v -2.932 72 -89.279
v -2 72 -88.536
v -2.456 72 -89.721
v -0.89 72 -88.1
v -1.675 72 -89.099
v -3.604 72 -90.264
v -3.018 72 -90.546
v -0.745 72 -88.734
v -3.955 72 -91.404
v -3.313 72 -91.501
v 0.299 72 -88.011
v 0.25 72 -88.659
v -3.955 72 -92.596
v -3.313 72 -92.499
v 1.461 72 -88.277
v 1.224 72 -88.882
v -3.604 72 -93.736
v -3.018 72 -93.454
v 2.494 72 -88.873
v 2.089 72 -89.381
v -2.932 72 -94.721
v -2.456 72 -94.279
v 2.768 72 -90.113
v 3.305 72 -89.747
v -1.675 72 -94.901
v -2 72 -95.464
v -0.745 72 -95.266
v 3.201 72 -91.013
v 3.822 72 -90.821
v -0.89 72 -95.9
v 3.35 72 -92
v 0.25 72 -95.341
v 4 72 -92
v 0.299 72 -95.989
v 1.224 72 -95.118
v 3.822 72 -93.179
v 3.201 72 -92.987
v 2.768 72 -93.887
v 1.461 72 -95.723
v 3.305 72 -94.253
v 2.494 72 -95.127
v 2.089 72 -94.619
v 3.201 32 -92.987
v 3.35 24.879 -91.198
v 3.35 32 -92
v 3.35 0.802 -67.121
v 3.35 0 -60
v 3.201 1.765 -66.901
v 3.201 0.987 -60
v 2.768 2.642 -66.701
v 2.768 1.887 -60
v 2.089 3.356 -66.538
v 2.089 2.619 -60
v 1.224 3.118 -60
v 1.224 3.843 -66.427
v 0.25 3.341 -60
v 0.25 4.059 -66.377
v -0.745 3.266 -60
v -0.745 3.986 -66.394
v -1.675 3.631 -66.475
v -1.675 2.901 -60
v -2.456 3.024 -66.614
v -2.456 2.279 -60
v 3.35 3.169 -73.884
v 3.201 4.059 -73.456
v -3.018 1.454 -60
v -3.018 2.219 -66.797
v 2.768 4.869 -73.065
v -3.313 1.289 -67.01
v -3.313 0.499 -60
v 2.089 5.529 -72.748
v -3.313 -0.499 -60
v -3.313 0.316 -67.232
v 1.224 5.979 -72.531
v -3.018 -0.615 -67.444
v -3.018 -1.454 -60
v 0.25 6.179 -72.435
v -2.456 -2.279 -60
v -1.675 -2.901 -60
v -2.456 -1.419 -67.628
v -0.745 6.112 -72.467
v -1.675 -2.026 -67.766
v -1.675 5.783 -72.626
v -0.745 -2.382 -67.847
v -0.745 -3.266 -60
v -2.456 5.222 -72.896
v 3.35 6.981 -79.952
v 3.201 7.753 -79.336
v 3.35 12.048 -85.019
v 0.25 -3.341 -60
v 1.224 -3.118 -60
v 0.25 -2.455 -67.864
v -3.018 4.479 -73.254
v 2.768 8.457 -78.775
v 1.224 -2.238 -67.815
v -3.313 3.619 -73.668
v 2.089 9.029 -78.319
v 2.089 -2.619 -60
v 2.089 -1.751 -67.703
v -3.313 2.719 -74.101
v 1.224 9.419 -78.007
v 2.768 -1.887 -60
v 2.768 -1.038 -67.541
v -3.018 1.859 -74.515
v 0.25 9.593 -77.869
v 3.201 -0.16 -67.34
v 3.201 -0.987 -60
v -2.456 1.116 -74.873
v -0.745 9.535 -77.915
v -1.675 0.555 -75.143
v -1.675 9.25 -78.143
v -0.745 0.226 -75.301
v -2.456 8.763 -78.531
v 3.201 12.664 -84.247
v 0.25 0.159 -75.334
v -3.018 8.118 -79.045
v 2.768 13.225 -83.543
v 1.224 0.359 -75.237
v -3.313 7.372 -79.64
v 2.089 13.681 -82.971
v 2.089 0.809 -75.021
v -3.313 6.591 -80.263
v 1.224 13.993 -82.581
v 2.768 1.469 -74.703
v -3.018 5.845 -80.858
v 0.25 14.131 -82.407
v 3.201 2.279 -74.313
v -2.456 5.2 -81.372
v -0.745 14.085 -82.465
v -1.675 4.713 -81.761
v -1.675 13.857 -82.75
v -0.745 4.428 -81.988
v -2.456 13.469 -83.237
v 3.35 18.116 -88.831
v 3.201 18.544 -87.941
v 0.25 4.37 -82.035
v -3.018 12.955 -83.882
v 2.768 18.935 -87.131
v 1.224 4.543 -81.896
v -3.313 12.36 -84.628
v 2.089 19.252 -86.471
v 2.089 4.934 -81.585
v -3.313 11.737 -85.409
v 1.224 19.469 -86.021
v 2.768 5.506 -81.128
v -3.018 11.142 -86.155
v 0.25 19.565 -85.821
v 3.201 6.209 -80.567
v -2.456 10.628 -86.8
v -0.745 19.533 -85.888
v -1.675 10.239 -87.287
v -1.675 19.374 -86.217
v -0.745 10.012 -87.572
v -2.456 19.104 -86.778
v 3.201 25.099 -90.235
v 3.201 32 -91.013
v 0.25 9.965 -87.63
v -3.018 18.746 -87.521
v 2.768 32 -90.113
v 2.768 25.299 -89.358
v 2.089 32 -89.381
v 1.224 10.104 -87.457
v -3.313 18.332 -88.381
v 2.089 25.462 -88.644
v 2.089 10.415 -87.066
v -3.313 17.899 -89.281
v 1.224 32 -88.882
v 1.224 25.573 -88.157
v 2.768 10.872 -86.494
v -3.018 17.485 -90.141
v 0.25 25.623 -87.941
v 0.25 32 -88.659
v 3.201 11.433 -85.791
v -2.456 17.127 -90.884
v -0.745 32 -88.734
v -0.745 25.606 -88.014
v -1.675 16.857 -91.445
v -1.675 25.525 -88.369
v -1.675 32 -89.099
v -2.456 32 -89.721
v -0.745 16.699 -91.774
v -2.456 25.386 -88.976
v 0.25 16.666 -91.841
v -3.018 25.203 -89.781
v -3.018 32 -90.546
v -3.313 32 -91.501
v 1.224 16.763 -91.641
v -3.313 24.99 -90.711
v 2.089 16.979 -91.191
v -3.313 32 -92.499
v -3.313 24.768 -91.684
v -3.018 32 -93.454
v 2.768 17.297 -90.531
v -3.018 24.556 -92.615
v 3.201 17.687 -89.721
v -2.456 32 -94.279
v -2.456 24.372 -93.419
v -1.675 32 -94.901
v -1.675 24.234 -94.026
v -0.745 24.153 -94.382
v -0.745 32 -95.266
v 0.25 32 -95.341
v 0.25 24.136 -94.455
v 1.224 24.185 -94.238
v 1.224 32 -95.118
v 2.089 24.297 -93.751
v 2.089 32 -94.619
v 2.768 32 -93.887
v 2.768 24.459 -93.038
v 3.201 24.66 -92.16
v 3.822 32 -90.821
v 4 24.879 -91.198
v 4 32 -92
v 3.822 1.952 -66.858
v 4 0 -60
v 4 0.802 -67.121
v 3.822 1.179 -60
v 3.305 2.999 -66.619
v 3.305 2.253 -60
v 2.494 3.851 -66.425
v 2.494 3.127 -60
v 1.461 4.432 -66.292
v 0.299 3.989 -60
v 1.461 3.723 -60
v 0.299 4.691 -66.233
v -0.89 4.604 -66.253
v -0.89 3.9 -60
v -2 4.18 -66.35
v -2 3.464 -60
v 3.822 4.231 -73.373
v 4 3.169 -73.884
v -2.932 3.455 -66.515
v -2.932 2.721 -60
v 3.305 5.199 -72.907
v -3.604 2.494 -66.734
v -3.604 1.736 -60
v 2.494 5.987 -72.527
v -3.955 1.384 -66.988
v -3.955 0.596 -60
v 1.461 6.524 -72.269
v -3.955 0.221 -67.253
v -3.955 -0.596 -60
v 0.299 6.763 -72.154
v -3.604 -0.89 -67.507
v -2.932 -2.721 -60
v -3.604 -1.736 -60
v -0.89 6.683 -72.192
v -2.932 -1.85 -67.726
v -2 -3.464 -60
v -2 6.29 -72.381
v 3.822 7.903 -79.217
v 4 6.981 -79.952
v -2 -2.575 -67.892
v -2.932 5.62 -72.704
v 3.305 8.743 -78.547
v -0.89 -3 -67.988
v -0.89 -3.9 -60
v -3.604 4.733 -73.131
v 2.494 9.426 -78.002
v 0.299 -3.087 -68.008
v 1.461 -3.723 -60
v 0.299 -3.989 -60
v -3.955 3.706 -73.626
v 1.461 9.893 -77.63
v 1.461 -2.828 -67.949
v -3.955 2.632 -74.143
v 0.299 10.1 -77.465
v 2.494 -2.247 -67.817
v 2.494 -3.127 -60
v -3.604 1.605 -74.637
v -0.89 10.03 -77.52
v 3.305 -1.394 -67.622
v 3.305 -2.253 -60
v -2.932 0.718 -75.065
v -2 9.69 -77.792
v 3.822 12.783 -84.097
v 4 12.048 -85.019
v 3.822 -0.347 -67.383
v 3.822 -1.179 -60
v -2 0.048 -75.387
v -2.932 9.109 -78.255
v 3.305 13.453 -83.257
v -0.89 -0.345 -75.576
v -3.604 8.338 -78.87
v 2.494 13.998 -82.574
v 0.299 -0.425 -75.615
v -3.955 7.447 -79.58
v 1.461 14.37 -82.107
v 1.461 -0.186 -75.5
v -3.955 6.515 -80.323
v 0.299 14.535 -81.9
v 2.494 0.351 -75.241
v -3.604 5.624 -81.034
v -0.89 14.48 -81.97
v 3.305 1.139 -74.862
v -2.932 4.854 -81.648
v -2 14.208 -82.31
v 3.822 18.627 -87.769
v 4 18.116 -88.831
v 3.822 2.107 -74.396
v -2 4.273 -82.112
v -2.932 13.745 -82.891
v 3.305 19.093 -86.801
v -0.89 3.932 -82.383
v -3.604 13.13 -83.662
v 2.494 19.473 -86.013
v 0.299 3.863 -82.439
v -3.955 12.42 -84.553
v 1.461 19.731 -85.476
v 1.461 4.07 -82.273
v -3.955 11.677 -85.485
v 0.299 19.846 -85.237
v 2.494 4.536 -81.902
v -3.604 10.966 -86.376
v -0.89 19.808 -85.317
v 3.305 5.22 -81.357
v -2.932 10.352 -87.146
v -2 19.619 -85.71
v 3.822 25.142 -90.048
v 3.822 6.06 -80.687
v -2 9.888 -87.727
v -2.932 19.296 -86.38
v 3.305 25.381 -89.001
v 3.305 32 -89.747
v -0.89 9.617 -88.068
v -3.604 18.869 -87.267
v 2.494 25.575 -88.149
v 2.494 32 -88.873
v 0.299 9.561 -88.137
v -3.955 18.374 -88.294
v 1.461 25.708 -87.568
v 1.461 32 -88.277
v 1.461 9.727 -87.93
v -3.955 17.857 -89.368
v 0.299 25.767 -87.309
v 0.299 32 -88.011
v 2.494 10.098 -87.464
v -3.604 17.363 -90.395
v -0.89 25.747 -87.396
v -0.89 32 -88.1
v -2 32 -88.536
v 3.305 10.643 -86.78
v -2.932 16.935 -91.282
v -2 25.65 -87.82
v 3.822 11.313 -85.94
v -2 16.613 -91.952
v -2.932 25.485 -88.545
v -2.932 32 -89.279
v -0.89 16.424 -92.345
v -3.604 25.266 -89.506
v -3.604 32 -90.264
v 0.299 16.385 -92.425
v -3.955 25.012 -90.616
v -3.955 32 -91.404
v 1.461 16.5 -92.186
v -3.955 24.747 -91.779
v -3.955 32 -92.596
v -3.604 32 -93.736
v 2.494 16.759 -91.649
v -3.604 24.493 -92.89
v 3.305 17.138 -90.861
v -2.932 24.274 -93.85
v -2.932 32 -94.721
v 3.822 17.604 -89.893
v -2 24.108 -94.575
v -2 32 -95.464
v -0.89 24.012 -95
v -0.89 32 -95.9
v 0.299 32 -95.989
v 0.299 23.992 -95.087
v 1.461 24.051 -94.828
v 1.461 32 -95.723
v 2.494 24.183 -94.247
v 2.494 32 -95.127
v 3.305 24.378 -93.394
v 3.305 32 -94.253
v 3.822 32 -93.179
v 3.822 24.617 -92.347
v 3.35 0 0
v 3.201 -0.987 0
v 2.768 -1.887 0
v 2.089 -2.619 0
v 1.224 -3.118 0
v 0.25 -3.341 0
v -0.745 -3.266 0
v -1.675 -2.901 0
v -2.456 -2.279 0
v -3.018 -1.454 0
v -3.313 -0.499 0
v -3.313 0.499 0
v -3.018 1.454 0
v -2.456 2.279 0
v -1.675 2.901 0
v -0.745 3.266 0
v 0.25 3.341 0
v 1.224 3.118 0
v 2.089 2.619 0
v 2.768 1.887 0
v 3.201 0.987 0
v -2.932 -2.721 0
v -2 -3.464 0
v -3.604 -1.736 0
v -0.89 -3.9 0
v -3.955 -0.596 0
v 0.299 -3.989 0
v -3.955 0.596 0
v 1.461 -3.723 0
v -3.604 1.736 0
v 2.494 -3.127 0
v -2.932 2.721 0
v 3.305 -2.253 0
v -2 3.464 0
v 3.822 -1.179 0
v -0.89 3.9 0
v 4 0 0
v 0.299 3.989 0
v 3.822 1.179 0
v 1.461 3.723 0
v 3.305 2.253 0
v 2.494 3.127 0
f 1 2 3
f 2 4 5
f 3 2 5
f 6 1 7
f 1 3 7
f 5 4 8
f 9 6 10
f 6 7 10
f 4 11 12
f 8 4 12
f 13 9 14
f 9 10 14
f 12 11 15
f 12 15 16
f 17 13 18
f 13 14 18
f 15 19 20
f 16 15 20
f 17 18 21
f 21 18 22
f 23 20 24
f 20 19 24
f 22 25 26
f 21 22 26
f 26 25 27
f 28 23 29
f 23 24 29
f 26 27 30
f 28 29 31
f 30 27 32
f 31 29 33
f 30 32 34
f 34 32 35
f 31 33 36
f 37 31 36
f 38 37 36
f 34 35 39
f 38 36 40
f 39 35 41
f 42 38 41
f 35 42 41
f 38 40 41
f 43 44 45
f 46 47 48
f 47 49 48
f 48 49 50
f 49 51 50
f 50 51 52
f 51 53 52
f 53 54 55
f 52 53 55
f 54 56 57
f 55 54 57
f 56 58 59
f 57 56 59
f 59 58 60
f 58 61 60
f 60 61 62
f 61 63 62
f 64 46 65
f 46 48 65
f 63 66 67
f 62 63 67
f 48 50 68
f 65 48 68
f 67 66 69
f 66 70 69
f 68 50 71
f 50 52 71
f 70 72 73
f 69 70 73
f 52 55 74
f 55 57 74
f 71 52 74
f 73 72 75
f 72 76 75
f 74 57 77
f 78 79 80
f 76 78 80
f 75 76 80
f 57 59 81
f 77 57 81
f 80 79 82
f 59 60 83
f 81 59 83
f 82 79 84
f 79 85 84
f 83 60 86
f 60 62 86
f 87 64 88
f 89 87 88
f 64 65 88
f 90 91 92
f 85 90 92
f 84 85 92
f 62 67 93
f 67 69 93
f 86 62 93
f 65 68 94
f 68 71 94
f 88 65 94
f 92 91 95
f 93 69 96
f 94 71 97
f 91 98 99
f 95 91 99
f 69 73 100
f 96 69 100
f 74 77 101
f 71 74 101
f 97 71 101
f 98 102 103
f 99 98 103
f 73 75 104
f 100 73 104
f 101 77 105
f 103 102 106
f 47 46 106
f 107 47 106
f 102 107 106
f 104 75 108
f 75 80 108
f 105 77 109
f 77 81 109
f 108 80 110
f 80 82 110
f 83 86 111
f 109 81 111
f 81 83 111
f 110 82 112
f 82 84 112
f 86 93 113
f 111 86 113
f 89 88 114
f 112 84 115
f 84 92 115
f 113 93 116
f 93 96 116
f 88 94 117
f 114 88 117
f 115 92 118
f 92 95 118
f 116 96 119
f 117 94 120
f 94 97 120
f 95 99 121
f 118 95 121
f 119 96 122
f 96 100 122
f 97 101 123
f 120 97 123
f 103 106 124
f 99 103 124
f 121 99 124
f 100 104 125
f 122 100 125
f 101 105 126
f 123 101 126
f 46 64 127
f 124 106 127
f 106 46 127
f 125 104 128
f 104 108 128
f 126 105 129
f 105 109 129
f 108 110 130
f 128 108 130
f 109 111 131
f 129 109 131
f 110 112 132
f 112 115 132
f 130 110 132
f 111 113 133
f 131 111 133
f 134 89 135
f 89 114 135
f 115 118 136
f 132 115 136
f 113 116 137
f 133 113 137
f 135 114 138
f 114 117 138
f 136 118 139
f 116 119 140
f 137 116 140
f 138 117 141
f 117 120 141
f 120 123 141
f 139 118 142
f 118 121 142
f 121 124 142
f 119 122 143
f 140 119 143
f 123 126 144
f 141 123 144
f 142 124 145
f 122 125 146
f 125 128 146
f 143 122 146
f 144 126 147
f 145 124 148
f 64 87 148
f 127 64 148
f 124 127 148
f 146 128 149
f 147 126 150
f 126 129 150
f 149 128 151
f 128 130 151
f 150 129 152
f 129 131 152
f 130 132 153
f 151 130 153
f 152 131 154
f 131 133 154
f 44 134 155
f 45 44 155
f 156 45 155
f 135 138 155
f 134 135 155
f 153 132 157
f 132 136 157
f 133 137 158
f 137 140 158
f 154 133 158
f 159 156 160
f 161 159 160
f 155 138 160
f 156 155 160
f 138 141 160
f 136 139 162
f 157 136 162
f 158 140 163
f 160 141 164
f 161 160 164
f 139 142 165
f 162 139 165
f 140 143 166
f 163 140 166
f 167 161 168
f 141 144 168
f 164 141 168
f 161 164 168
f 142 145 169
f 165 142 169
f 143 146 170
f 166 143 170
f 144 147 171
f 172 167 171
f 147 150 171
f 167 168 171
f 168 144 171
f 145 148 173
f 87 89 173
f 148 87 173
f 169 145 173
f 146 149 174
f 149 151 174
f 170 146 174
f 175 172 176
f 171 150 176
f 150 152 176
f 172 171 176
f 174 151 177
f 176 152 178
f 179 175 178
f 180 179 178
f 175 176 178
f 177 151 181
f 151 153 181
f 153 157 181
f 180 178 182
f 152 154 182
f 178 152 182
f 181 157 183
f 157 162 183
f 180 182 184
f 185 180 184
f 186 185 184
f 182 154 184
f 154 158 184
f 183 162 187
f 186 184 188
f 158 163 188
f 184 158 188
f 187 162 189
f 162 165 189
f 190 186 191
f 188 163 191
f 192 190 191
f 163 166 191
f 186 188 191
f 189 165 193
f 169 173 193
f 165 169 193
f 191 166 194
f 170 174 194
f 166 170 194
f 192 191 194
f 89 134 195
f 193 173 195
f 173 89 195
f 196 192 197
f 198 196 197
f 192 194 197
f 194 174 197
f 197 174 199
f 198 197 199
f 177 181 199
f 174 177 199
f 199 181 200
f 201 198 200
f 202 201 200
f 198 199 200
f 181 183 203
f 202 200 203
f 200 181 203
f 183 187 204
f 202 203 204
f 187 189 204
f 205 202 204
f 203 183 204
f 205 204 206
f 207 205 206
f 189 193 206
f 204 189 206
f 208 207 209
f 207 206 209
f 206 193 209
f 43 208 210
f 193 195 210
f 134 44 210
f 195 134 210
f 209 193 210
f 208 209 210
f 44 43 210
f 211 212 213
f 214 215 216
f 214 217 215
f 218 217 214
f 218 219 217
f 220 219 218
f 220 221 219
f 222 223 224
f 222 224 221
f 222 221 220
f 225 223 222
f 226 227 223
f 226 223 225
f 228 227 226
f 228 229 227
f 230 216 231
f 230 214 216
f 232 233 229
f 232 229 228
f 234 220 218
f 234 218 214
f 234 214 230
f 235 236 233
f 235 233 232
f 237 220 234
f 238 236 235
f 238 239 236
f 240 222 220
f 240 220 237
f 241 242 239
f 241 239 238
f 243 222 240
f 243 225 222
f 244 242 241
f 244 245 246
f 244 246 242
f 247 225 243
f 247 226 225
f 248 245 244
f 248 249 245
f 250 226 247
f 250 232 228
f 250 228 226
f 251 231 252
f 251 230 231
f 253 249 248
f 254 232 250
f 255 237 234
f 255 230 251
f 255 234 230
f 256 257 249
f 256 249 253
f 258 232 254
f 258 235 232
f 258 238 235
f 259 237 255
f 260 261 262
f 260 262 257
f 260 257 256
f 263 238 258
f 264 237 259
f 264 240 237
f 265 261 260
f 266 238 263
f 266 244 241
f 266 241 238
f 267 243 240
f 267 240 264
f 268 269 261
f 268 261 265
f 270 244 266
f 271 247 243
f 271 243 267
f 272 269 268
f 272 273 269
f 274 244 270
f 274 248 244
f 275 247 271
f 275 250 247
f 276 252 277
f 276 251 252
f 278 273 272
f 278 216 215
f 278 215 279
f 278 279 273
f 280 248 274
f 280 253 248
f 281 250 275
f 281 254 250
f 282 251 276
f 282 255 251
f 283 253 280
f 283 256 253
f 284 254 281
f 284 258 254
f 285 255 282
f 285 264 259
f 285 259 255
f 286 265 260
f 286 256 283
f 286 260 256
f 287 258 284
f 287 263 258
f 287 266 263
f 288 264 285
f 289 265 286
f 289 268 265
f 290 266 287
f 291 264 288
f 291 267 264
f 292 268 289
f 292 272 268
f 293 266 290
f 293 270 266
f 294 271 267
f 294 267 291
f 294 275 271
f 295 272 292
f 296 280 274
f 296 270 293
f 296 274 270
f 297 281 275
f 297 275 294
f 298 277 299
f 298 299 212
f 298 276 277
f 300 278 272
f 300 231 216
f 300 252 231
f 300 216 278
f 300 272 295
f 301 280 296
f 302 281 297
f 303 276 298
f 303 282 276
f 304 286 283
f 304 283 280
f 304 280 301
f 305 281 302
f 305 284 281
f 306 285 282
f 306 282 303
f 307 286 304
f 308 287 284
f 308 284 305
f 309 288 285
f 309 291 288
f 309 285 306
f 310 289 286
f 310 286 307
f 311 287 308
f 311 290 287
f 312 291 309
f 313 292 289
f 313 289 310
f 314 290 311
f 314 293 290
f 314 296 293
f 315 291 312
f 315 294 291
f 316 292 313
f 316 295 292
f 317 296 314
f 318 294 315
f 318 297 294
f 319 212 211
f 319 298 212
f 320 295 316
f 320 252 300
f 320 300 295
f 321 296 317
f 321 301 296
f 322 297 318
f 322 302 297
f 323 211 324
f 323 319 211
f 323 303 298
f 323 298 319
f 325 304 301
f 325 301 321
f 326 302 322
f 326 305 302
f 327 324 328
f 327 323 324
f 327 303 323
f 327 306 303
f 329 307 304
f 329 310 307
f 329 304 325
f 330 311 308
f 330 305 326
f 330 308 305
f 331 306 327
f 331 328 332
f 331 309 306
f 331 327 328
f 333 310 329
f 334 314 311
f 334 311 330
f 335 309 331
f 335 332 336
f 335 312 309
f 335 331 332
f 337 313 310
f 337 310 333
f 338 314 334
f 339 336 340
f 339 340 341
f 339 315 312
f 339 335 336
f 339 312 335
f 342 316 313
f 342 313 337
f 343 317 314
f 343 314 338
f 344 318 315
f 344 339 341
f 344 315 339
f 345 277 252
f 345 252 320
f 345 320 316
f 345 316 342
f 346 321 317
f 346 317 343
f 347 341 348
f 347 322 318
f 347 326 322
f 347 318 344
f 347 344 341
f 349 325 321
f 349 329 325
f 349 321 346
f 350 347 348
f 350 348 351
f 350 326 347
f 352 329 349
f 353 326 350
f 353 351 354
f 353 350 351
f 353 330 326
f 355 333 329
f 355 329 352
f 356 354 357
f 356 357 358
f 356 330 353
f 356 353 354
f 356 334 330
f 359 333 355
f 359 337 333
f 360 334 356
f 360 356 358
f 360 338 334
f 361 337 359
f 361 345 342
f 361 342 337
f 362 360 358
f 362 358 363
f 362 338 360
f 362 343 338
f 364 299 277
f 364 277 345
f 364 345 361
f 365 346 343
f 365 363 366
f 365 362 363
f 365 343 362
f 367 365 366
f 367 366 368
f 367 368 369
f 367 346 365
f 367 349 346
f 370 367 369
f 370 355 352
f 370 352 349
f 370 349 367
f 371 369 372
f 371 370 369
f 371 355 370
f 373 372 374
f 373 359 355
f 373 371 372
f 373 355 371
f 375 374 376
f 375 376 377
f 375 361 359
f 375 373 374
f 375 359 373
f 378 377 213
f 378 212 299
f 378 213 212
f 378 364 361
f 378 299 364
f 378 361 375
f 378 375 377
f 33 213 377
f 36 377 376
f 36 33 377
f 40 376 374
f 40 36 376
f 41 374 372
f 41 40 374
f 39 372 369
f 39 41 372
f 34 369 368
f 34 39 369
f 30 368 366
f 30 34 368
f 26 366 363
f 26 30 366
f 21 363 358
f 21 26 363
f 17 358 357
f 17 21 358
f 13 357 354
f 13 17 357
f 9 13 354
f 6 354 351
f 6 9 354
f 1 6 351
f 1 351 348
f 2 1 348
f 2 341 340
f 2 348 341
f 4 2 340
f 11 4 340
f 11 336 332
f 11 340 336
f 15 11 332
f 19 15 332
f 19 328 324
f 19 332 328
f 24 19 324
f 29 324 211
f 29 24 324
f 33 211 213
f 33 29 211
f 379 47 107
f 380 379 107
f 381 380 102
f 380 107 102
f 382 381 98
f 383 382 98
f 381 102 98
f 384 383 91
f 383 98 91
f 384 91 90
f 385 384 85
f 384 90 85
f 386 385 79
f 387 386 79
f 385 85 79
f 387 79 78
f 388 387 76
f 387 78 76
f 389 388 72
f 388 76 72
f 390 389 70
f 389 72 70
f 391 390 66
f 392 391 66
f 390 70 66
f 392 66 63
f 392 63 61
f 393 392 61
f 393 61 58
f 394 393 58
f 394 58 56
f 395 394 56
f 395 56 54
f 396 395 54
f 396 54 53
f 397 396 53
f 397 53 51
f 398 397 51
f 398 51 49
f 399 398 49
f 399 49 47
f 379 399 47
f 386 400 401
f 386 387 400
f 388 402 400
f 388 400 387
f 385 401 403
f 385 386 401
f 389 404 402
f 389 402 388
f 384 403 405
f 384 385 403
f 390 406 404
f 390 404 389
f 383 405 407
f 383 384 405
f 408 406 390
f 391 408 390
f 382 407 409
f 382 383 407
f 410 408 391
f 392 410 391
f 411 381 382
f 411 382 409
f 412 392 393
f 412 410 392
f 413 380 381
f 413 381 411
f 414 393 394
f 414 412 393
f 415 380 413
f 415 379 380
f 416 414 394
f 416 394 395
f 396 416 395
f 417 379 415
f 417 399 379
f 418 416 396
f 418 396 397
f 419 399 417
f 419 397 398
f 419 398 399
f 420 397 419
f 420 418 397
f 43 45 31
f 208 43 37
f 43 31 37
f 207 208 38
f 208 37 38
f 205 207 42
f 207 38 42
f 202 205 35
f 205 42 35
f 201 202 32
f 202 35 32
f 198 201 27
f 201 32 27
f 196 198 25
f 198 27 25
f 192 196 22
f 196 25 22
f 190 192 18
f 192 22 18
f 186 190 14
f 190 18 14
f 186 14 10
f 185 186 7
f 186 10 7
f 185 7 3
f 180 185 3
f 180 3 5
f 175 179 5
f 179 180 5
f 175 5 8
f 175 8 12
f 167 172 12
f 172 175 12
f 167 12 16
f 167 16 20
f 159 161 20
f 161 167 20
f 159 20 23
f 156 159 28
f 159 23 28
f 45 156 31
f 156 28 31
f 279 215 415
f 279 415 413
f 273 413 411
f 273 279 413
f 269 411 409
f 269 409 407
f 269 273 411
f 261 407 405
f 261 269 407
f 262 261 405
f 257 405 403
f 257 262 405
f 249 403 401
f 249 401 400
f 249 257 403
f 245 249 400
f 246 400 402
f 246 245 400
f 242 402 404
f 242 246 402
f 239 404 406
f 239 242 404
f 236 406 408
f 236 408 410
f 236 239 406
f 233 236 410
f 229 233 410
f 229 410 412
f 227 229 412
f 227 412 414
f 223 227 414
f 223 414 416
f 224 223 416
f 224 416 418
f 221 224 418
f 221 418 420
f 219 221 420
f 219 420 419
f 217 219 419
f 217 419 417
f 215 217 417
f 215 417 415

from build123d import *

# Parameters (mm, degrees)
SKETCH2_R = 4
SKETCH3_R = 3.35


with BuildPart() as part:
    # Sweep1: sweep along a path in Sketch1
    with BuildLine(Plane(origin=(0, 0, 0), x_dir=(0, 0, -1), z_dir=(1, 0, 0))) as sweep1_path:
        Line((0, 0), (60, 0))
        ThreePointArc((60, 0), (82.627416998, 9.372583002), (92, 32))
        Line((92, 32), (92, 72))
    # Sketch2 → Sweep1 (sweep)
    with BuildSketch(Plane.XY):
        Circle(SKETCH2_R)
    sweep(path=sweep1_path.line)

    # Cut-Sweep1: sweep along a path in Sketch1<4>
    with BuildLine(Plane(origin=(0, 0, 0), x_dir=(0, 0, -1), z_dir=(1, 0, 0))) as cut_sweep1_path:
        Line((0, 0), (60, 0))
        ThreePointArc((60, 0), (82.627416998, 9.372583002), (92, 32))
        Line((92, 32), (92, 72))
    # Sketch3 → Cut-Sweep1 (sweep, cut)
    with BuildSketch(Plane.XY):
        Circle(SKETCH3_R)
    sweep(path=cut_sweep1_path.line, mode=Mode.SUBTRACT)


solid = part.part
